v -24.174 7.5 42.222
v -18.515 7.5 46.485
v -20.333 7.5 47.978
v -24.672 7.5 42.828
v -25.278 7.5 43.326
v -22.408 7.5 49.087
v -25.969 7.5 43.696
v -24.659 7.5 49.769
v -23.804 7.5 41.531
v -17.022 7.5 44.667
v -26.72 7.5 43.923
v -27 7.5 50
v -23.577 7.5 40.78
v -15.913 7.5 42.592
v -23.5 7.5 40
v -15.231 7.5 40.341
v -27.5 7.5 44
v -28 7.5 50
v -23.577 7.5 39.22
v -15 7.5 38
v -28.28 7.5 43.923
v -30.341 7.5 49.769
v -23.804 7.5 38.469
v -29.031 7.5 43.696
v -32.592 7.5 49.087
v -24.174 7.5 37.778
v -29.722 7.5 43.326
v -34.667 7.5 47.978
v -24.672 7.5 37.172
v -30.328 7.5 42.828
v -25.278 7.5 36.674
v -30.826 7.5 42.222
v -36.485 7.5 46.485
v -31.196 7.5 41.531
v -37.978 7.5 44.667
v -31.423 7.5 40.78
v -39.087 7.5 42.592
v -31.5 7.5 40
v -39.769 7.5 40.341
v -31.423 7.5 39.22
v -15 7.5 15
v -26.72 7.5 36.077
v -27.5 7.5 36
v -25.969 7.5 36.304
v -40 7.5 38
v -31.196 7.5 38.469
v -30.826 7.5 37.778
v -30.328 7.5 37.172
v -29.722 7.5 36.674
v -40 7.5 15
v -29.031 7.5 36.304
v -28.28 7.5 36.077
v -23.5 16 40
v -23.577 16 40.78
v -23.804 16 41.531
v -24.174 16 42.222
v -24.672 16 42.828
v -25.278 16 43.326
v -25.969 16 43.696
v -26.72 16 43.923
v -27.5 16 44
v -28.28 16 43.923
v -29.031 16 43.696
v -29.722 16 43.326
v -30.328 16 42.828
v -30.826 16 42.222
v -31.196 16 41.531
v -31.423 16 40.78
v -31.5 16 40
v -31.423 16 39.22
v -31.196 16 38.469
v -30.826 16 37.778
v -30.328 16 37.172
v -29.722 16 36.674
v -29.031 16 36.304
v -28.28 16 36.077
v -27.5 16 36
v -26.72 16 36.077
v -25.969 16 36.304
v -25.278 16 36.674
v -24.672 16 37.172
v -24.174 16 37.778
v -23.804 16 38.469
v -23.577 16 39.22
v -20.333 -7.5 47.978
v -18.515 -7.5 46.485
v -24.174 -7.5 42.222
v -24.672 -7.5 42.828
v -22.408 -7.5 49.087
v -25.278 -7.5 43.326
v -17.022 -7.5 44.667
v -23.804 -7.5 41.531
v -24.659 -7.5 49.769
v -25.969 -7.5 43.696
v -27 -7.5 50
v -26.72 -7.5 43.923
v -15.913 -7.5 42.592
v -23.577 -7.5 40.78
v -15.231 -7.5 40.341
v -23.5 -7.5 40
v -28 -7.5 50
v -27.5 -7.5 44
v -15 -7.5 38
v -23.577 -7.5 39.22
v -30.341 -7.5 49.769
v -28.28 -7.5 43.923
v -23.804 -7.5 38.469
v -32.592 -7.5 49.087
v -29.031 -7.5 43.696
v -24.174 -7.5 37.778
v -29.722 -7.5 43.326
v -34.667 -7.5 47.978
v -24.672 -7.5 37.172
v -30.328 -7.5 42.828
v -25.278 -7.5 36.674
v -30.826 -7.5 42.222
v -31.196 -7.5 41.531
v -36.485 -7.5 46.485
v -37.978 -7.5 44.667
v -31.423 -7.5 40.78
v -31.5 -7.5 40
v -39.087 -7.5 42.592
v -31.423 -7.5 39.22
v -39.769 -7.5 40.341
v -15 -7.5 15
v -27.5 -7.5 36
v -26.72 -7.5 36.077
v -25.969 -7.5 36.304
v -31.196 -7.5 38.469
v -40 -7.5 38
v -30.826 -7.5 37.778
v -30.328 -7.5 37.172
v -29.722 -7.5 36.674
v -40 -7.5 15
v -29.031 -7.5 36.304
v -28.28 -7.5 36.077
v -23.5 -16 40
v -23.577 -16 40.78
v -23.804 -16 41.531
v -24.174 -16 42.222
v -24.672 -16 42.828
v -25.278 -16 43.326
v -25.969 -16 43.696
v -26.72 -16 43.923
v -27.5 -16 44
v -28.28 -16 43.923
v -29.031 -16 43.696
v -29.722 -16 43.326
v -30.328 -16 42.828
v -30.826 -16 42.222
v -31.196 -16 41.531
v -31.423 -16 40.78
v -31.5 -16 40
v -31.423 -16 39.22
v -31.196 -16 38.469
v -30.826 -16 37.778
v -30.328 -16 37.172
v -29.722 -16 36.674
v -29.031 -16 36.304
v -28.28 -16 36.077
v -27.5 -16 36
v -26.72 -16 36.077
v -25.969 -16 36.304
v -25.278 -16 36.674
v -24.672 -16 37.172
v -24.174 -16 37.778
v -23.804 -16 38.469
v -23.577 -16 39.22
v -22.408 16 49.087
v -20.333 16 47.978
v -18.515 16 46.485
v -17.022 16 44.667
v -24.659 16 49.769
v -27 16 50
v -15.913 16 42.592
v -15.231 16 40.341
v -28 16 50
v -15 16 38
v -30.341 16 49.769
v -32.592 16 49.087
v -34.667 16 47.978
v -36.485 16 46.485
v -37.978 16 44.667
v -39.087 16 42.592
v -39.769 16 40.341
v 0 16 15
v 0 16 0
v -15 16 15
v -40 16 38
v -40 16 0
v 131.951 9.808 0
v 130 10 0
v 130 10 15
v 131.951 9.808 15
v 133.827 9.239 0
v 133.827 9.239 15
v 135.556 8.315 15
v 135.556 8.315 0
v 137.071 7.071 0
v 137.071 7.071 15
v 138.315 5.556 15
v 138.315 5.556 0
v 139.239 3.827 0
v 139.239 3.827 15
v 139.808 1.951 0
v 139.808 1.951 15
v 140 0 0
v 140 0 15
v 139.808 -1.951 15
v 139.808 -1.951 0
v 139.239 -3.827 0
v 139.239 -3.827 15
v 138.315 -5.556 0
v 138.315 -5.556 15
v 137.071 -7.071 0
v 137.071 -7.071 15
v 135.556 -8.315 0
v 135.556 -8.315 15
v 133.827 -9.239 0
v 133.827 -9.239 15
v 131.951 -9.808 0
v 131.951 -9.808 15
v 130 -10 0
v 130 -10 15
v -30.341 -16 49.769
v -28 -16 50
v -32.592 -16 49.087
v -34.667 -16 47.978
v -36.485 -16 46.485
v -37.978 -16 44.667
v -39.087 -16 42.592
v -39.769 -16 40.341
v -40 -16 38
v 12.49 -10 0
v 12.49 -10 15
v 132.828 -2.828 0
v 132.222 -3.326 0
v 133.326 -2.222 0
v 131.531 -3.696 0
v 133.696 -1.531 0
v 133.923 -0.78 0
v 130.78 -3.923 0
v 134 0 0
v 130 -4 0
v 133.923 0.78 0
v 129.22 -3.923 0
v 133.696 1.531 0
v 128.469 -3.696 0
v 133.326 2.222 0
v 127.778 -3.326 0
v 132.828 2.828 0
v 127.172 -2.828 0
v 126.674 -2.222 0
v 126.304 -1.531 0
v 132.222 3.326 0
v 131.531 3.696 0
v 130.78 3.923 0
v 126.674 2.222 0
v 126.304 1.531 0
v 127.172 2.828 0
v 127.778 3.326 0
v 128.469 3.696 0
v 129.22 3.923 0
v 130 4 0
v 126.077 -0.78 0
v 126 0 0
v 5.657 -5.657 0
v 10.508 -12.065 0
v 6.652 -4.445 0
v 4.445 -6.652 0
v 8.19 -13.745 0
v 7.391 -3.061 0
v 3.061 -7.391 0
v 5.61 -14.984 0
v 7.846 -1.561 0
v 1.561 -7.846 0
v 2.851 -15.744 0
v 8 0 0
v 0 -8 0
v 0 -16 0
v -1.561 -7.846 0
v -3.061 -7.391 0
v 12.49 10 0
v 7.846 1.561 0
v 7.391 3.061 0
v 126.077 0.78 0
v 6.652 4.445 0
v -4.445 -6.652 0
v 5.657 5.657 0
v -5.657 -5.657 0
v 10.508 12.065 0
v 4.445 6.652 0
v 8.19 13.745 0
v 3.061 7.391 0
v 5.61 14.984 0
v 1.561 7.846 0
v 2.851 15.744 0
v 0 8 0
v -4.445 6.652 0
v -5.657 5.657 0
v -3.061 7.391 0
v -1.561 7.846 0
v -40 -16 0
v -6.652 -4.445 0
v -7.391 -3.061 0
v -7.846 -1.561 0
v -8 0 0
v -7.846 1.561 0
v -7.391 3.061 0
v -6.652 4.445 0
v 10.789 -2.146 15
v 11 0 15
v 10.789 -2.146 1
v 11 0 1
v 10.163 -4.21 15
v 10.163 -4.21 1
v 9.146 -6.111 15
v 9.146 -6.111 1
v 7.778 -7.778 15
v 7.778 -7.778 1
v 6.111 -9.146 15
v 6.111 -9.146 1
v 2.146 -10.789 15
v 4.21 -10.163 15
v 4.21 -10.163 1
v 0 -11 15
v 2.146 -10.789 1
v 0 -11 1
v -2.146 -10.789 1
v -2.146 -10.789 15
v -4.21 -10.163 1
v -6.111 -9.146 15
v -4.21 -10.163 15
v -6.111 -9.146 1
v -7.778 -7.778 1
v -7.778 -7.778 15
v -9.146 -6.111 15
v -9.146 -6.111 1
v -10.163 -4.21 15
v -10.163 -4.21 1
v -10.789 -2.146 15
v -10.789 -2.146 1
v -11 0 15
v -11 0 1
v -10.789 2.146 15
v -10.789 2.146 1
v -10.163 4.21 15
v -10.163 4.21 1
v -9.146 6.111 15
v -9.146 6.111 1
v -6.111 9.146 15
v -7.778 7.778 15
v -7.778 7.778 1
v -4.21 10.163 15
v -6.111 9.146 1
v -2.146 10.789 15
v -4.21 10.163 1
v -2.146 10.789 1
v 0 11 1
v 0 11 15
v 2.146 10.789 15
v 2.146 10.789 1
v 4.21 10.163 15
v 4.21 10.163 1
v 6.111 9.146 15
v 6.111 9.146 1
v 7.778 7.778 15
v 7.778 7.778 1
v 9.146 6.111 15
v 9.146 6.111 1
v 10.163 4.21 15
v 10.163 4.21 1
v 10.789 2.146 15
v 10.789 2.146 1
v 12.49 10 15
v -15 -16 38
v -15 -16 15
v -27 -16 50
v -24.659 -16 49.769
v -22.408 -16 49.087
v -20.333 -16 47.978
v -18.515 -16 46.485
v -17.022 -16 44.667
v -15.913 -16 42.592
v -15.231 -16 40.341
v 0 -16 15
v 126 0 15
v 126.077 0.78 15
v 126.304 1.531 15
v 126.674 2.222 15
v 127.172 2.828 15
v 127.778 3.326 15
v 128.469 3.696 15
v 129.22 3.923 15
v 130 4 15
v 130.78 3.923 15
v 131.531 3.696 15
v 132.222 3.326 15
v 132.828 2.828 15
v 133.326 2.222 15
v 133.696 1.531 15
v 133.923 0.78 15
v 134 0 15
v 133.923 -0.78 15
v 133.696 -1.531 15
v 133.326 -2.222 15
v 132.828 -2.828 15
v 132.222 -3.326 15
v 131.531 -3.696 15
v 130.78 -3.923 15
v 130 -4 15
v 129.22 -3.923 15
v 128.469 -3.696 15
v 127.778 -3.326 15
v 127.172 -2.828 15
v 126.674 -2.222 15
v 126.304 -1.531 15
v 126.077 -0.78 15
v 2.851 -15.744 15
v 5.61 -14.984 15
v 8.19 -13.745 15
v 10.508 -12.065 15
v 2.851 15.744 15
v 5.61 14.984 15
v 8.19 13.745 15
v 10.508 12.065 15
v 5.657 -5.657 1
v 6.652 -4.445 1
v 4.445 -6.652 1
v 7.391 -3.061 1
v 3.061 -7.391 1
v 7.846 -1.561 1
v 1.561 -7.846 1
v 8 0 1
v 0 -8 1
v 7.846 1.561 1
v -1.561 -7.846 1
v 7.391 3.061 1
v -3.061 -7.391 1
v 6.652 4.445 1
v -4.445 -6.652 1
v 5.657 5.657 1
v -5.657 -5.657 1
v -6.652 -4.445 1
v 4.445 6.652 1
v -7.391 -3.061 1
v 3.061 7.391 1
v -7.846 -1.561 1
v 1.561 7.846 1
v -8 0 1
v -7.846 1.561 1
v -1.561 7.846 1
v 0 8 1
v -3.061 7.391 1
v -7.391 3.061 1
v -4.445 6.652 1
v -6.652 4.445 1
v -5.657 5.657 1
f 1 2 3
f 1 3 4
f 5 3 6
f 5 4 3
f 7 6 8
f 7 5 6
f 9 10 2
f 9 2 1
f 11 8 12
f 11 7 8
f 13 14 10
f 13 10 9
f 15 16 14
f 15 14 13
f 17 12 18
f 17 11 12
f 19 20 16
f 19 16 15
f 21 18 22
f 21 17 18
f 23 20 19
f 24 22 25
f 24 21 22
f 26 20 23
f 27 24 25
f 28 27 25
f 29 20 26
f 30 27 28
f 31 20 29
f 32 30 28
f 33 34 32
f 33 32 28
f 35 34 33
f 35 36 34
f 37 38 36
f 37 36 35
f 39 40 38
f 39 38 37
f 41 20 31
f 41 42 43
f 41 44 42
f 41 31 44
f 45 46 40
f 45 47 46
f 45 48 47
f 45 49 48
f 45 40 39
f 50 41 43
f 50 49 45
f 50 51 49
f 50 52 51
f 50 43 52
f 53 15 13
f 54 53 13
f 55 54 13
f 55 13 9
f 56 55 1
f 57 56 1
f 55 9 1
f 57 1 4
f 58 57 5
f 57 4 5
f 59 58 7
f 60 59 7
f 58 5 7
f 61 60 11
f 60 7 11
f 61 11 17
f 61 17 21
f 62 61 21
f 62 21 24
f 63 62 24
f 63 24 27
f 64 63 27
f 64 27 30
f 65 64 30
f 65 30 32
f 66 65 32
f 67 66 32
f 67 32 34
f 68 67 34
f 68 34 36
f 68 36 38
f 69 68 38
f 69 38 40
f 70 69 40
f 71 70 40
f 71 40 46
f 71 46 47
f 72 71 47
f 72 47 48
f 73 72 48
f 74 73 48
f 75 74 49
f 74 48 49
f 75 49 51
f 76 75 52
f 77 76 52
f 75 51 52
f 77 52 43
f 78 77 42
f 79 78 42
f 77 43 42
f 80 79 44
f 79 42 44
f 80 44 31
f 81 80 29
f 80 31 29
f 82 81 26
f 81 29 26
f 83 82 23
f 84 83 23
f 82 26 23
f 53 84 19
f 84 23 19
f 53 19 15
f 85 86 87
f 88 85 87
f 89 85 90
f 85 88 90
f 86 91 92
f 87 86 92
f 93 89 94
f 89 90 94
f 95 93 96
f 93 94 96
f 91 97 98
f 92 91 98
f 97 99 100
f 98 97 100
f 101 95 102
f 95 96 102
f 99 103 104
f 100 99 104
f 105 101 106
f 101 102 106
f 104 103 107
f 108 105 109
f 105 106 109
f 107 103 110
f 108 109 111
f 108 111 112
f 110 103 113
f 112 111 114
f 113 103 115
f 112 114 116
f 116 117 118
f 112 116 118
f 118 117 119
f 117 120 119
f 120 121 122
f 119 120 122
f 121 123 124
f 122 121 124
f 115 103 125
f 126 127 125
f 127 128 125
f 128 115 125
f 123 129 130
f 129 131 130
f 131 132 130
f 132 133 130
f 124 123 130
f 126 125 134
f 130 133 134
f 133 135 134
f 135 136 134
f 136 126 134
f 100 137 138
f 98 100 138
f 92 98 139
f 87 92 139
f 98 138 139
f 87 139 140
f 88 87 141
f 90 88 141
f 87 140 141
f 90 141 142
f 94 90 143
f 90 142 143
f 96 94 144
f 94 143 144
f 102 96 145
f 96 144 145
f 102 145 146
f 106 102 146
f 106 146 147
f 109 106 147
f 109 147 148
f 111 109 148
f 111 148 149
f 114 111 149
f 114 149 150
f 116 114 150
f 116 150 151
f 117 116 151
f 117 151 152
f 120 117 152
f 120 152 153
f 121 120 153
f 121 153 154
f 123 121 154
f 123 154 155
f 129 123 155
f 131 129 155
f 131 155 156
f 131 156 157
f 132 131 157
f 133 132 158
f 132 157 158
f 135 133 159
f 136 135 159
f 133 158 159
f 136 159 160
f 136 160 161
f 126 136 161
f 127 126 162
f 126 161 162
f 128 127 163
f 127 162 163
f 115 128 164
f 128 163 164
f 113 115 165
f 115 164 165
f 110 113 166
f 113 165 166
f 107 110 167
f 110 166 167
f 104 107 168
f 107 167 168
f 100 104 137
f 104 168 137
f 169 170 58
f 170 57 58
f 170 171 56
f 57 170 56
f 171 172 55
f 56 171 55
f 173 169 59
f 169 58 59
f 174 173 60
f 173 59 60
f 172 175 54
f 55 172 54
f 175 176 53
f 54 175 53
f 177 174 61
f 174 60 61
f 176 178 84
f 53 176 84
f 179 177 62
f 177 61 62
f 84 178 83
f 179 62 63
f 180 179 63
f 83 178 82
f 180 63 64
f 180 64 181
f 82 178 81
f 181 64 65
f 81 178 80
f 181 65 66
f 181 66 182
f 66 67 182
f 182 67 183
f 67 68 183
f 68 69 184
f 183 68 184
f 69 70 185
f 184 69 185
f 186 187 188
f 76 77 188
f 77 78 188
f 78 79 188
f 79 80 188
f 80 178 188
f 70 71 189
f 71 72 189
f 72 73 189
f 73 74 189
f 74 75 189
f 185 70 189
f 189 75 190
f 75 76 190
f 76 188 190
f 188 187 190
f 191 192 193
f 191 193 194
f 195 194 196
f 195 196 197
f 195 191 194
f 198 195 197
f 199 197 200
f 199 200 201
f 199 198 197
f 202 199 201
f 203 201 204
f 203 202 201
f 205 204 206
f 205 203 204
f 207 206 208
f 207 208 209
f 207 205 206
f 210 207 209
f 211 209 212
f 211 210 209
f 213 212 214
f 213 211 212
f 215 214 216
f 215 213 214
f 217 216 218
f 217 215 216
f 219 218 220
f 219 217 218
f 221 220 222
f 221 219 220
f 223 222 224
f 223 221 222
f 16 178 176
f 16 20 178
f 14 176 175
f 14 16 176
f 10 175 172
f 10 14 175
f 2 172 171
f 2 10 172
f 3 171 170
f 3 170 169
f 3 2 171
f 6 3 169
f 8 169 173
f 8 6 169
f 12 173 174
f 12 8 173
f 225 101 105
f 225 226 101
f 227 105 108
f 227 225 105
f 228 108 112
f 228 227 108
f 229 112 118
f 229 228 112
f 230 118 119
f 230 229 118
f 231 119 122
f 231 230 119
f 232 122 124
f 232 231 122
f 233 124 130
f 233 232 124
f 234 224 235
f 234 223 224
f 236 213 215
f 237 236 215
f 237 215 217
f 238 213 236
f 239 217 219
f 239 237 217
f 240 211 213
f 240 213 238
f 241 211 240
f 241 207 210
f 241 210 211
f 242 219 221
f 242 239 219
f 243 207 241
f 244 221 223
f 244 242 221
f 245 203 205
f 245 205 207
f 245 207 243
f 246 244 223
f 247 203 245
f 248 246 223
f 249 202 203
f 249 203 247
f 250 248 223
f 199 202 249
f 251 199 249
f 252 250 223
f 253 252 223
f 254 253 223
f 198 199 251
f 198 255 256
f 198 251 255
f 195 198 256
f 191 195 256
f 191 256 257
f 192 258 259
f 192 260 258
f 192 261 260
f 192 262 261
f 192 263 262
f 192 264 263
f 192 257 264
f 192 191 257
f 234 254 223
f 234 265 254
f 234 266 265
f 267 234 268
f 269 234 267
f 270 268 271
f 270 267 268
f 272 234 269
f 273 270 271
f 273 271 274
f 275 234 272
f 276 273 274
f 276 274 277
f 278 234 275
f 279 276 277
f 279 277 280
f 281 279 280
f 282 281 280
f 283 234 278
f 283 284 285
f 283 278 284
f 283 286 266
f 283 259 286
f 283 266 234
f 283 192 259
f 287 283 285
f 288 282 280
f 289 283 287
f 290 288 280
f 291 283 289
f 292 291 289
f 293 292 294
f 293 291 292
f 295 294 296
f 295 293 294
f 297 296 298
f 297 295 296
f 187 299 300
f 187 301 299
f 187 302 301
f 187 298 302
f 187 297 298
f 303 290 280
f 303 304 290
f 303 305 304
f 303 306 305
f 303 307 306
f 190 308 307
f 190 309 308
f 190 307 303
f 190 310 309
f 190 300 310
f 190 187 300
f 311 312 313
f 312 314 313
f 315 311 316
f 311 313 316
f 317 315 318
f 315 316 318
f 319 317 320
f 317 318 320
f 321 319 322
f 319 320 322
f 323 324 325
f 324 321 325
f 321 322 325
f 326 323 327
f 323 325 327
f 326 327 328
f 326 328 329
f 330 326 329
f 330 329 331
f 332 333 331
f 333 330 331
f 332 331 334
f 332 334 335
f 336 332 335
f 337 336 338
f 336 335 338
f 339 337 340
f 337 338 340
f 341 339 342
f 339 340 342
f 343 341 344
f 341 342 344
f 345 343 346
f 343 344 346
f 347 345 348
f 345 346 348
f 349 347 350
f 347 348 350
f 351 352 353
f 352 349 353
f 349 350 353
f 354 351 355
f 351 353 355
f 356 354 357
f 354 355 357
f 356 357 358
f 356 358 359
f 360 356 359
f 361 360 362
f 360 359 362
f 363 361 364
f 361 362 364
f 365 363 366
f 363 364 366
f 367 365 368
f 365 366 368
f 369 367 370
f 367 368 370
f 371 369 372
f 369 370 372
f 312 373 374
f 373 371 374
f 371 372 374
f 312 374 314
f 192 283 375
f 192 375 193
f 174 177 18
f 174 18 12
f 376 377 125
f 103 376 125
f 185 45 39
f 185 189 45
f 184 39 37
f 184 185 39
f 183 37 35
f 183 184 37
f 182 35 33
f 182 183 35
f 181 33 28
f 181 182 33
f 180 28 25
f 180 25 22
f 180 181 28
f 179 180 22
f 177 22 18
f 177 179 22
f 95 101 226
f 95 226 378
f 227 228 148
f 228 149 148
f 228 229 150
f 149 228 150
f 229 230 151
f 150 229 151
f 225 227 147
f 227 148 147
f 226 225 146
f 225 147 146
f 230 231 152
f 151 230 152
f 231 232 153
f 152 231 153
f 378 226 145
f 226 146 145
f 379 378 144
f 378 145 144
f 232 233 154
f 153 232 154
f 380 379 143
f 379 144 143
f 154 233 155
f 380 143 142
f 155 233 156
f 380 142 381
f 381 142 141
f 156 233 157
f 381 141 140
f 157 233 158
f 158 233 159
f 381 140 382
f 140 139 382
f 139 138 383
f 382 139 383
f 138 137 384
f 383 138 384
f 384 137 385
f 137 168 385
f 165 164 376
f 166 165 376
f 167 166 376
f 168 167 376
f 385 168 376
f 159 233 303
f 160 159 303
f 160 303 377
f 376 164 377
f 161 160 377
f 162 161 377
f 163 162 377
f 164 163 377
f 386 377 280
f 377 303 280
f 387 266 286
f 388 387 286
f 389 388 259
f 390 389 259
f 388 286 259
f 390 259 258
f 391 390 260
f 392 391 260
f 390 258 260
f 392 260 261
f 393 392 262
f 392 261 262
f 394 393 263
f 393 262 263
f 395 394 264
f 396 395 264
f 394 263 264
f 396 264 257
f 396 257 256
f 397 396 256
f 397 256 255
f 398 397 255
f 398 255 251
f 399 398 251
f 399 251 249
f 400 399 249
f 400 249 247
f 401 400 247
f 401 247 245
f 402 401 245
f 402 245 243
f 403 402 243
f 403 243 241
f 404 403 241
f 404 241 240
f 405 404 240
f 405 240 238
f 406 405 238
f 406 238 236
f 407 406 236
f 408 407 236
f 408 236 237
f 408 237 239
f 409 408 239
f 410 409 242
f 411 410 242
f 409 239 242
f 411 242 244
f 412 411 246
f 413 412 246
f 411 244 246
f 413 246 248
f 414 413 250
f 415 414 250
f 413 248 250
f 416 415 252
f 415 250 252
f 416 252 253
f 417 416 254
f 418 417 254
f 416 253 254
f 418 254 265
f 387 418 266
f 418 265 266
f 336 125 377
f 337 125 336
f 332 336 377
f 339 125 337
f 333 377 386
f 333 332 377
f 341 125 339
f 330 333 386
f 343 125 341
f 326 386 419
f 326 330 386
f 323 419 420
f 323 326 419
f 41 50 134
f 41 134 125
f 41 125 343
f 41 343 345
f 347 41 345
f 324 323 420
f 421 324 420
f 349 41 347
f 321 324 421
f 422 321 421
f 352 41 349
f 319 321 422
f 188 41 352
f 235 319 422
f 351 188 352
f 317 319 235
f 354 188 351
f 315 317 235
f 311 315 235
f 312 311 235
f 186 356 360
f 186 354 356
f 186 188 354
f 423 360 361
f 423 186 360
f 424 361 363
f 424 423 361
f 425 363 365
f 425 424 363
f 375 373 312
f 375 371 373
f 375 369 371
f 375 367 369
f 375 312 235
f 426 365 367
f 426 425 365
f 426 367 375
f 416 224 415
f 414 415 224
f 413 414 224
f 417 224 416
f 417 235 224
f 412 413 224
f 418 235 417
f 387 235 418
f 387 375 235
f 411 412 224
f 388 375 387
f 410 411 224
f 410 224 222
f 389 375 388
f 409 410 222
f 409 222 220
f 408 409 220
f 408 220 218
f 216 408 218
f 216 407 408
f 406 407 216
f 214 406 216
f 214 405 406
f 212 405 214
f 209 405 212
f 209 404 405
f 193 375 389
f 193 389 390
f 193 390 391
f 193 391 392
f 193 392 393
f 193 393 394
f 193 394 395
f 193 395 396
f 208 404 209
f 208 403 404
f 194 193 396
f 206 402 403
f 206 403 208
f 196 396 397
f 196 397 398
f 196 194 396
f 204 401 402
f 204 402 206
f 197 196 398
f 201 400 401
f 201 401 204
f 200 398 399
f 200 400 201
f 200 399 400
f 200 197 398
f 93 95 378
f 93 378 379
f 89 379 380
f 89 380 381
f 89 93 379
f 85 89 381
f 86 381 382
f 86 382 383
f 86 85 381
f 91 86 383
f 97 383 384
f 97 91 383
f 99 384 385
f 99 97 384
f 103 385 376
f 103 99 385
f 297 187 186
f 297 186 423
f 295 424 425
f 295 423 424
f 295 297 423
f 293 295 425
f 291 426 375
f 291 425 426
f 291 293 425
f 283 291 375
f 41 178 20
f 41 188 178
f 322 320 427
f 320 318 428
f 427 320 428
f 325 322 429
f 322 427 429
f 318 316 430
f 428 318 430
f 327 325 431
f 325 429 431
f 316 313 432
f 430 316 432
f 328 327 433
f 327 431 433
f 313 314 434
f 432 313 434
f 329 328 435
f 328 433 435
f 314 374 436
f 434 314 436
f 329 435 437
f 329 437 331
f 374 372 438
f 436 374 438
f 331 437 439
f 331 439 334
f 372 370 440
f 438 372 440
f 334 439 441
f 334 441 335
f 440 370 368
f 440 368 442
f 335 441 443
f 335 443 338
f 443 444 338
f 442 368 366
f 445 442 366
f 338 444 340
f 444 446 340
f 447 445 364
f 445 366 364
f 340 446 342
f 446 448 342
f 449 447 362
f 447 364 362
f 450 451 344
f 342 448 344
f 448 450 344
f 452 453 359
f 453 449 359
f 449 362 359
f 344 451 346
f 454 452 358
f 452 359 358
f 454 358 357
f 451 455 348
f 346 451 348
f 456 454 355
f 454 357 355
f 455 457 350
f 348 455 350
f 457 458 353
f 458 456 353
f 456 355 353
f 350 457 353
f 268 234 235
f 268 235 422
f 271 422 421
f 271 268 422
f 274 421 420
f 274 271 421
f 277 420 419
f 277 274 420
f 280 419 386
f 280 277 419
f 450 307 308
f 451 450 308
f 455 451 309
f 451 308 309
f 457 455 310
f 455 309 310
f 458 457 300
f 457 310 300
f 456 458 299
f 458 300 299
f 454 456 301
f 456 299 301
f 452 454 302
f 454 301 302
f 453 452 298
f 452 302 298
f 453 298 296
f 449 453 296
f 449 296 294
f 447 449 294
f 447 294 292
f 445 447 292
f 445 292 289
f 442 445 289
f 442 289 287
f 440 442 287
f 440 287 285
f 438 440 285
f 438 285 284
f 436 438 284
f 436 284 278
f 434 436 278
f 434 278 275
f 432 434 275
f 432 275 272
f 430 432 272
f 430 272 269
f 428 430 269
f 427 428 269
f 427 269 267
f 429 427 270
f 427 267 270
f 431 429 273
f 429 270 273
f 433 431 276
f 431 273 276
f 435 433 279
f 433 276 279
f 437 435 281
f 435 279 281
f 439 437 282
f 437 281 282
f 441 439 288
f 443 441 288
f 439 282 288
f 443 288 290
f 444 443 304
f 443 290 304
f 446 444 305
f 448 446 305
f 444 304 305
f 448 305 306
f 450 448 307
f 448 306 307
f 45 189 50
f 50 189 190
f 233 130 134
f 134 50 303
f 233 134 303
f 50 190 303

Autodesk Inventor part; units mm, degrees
ref_plane "YZ Plane" through (0, 0, 0) normal (1, 0, 0) x (0, 1, 0)
ref_plane "XZ Plane" through (0, 0, 0) normal (0, 1, 0) x (-1, 0, 0)
ref_plane "XY Plane" through (0, 0, 0) normal (0, 0, 1) x (1, 0, 0)
sketch "Sketch1" plane through (0, 0, 0) normal (0, 0, 1) x (1, 0, 0)
  line L0 (0, 0) -> (-40, 0) construction
  line L1 (0, 16) -> (-40, 16)
  line L2 (-40, -16) -> (0, -16)
  arc A0 (0, -16) -> (0, 16) centre (0, 0) ccw
  arc A1 (-40, 16) -> (-40, -16) centre (-40, 0) ccw construction
  circle A2 centre (0, 0) radius 11
  line L3 (-40, 16) -> (-40, -16)
  point P0 (-20, 0)
  dimension "d0" = 22
  dimension "d1" = 5
  dimension "d2" = 40
extrude "Extrusion1" add sketch "Sketch1" along normal blind 15
sketch "Sketch2" plane through (0, 0, 15) normal (0, 0, 1) x (1, 0, 0)
  line L0 (0, 16) -> (-40, 16) projected
  line L1 (-40, 16) -> (-15, 16)
  line L2 (-15, 16) -> (-15, 7.5)
  line L3 (-15, 7.5) -> (-40, 7.5)
  line L4 (-40, 7.5) -> (-40, 16)
  line L5 (-40, 16) -> (-40, -16) projected
  line L6 (-40, -16) -> (-15, -16)
  line L7 (-15, -16) -> (-15, -7.5)
  line L8 (-15, -7.5) -> (-40, -7.5)
  line L9 (-40, -7.5) -> (-40, -16)
  point P0 (0, 0)
  dimension "d5" = 25
  dimension "d6" = 15
extrude "Extrusion2" add sketch "Sketch2" along normal blind 35
sketch "Sketch3" plane through (-40, -16, 0) normal (0, -1, 0) x (1, 0, 0)
  line L0 (0, 15) -> (25, 15) projected
  line L1 (0, 50) -> (25, 50) construction
  line L2 (12.5, 50) -> (12.5, 40) construction
  circle A0 centre (12.5, 40) radius 4
  point P0 (40, 0)
  dimension "d9" = 8
  dimension "d10" = 10
extrude "Extrusion3" cut sketch "Sketch3" against normal through all
fillet "Fillet1" radius 12 4 edges at (-15, 11.75, 50) (-40, 11.75, 50) (-15, -11.75, 50) (-40, -11.75, 50)
sketch "Sketch4" plane through (0, 0, 0) normal (0, 0, -1) x (-1, 0, 0)
  circle A0 centre (0, 0) radius 11 projected
  circle A1 centre (0, 0) radius 8
  dimension "d14" = 16
extrude "Extrusion4" add sketch "Sketch4" against normal blind 1
sketch "Sketch5" plane through (0, 0, 0) normal (0, 0, -1) x (-1, 0, 0)
  arc A0 (-120, 50) -> (-120, -50) centre (0, 0) ccw construction
  line L0 (0, 0) -> (-120, 50) construction
  circle A1 centre (0, 0) radius 11 construction
  line L1 (0, 0) -> (-120, -50) construction
  line L2 (0, 0) -> (-130, 0) construction
  line L3 (-120, 50) -> (-120, -50) construction
  line L4 (0, 0) -> (-130, 0) construction
  line L5 (0, 10) -> (-12.49, 10)
  line L6 (-130, -10) -> (-12.49, -10)
  arc A2 (0, -10) -> (0, 10) centre (0, 0) ccw
  arc A3 (-130, 10) -> (-130, -10) centre (-130, 0) ccw
  circle A4 centre (-130, 0) radius 4
  arc A5 (0, 16) -> (0, -16) centre (0, 0) ccw projected
  arc A6 (-12.49, 10) -> (-12.49, -10) centre (0, 0) ccw
  line L7 (-12.49, 10) -> (-130, 10)
  line L8 (-12.49, -10) -> (0, -10)
  point P0 (-65, 0)
  dimension "d17" = 100
  dimension "d18" = 130
  dimension "d19" = 45.24
  dimension "d20" = 10
  dimension "d21" = 8
extrude "Extrusion5" add sketch "Sketch5" against normal up to surface (15 mm away) contours A5 L6 A3 L7
properties part number "tiller rotation bracket"
